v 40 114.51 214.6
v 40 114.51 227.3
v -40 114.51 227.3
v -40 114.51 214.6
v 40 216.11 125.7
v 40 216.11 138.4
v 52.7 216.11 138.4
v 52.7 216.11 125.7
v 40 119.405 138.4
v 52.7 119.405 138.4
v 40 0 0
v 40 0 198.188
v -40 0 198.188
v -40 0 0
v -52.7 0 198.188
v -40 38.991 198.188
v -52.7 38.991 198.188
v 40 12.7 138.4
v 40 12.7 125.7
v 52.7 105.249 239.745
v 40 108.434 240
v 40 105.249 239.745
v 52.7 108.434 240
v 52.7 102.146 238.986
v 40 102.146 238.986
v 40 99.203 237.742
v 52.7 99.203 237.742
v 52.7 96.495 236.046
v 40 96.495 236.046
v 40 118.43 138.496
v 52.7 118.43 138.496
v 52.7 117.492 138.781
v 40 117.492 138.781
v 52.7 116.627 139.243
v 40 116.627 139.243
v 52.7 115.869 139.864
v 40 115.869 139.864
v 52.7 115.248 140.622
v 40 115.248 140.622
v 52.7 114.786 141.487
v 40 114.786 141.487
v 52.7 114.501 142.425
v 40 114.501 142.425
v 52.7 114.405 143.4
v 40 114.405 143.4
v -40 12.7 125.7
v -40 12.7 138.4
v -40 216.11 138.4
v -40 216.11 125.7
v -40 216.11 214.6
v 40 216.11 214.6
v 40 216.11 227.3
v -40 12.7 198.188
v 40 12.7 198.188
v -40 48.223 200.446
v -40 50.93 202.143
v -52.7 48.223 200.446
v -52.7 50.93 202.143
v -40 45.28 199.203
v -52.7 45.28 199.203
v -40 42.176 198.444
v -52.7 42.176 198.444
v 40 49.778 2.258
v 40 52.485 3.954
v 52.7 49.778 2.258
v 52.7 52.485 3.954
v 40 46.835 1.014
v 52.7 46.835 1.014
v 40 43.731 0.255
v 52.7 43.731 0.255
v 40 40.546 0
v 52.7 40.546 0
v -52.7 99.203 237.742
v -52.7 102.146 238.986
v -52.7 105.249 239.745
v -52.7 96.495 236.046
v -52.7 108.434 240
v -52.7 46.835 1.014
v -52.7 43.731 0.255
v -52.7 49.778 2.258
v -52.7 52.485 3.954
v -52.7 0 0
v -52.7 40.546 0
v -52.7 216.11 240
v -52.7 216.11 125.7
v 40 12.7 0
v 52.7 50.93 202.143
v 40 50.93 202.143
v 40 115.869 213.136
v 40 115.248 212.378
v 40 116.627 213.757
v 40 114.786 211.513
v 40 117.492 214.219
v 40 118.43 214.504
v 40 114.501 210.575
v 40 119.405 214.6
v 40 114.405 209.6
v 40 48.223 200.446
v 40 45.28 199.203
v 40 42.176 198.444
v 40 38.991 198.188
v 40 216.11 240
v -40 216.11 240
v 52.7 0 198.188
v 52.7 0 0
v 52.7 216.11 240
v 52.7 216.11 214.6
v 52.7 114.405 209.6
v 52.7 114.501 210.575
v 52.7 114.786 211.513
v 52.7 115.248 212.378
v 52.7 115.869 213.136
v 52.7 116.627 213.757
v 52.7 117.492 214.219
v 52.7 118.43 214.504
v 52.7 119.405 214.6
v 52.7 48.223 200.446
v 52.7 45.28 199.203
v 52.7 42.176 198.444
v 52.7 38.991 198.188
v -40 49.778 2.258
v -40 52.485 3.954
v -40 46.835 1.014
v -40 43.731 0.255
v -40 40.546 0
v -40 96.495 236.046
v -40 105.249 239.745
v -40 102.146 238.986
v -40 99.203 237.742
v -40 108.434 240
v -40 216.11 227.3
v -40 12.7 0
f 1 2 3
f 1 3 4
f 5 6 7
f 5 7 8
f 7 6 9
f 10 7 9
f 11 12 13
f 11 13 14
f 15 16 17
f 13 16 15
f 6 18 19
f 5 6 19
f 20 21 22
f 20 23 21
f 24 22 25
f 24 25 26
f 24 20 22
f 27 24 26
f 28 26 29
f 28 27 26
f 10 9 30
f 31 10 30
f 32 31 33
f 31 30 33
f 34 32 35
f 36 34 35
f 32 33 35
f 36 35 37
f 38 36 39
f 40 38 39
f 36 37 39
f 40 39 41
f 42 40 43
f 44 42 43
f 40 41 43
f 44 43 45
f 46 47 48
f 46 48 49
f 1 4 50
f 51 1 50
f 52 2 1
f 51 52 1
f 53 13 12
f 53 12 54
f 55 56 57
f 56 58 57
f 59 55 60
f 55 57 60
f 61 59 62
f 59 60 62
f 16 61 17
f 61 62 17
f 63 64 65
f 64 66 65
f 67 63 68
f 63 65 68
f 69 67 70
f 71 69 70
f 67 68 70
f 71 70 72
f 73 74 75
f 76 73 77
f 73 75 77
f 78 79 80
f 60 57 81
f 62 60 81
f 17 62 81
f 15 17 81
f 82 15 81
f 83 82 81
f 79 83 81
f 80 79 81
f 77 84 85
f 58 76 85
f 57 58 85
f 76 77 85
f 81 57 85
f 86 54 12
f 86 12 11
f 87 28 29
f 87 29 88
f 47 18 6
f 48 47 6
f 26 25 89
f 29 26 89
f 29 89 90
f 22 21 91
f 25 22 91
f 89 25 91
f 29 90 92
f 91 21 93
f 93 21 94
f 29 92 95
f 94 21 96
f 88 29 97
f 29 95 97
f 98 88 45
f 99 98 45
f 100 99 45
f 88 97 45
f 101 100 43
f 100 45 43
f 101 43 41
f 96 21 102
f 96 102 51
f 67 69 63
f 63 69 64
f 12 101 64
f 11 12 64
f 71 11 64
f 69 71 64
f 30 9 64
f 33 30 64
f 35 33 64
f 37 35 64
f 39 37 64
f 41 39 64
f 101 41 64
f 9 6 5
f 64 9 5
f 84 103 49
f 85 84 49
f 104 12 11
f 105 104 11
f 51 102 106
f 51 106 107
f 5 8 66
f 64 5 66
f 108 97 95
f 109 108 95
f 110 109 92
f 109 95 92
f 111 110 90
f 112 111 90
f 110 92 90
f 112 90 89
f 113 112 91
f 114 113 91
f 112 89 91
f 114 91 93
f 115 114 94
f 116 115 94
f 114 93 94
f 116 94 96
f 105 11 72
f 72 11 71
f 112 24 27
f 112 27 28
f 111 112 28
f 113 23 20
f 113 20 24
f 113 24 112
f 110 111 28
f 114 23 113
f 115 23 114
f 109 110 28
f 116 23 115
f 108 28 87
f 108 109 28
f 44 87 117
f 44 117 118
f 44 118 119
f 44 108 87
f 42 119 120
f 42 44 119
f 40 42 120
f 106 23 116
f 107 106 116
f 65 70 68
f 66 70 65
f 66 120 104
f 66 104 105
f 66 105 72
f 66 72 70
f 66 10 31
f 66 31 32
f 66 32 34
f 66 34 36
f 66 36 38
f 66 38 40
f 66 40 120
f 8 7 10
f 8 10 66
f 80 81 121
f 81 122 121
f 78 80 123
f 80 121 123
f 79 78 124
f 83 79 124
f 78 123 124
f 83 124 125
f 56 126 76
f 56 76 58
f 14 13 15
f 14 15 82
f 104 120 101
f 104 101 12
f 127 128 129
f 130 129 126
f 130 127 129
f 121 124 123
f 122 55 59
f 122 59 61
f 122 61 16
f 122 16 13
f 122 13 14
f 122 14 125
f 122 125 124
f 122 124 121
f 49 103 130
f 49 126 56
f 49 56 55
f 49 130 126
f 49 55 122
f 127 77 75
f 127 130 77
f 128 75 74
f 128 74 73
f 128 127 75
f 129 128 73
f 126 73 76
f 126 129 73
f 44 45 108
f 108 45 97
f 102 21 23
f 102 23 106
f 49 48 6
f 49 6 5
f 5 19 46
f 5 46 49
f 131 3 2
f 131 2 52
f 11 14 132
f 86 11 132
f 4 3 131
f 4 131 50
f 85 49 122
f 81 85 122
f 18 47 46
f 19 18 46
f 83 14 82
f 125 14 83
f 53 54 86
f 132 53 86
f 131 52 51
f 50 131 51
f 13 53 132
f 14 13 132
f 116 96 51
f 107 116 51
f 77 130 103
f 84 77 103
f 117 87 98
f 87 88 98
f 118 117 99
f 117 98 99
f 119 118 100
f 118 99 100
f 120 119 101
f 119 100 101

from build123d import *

# Parameters (mm, degrees)
BOSS_EXTRUDE1_START     = 40
SKETCH1_W               = 240
SKETCH1_H               = 216.11
BOSS_EXTRUDE1_DEPTH     = 12.7
CUT_EXTRUDE1_DEPTH      = 1
CUT_EXTRUDE1_DEPTH_BACK = 106.4
BOSS_EXTRUDE2_START     = -12.7
SKETCH3_W               = 198.18830704
SKETCH3_H               = 12.7
BOSS_EXTRUDE2_DEPTH     = 80
BOSS_EXTRUDE3_START     = -12.7
SKETCH4_W               = 12.7
SKETCH4_H               = 203.41
BOSS_EXTRUDE3_DEPTH     = 80
SKETCH5_W               = 12.7
SKETCH5_H               = 101.6
BOSS_EXTRUDE4_DEPTH     = 80
CUT_EXTRUDE2_DEPTH      = 223.7
FILLET1_R               = 20
FILLET2_R               = 20


with BuildPart() as part:
    # Sketch1 → Boss-Extrude1 (new body)
    with BuildSketch(Plane(origin=(0, 0, 0), x_dir=(0, 0, -1), z_dir=(1, 0, 0)).offset(BOSS_EXTRUDE1_START)):
        with Locations((-120, 108.055)):
            Rectangle(SKETCH1_W, SKETCH1_H)
    extrude(amount=BOSS_EXTRUDE1_DEPTH)


with BuildPart() as body_2:
    # Mirror3: mirrored copy
    add(part.part.mirror(Plane(origin=(0, 0, 0), x_dir=(0, 0, 1), z_dir=(1, 0, 0))))


with BuildPart() as cut_extrude1_tool:
    # Sketch2 → Cut-Extrude1 (new body, two sides)
    with BuildSketch(Plane(origin=(52.7, 0, 0), x_dir=(0, 0, -1), z_dir=(1, 0, 0))) as cut_extrude1_sk:
        Polygon((-125.7, 216.11), (0, 47.170775707), (0, 216.11), align=None)
        Polygon((-240, 101.81), (-198.18830704, 45.615608791), (-198.18830704, 0), (-240, 0), align=None)
    extrude(amount=CUT_EXTRUDE1_DEPTH)
    extrude(cut_extrude1_sk.sketch, amount=-CUT_EXTRUDE1_DEPTH_BACK)


with BuildPart() as part_1:
    add(part.part)

    # Cut-Extrude1: cut by cut_extrude1_tool
    add(cut_extrude1_tool.part, mode=Mode.SUBTRACT)

    # Sketch7 → Cut-Extrude2 (cut)
    with BuildSketch(Plane(origin=(0, 0, 0), x_dir=(0, 0, -1), z_dir=(1, 0, 0))):
        with BuildLine():
            Line((-214.6, 216.11), (-138.4, 216.11))
            Line((-138.4, 216.11), (-138.4, 119.405))
            ThreePointArc((-138.4, 119.405), (-139.864466094, 115.869466094), (-143.4, 114.405))
            Line((-143.4, 114.405), (-209.6, 114.405))
            ThreePointArc((-209.6, 114.405), (-213.135533906, 115.869466094), (-214.6, 119.405))
            Line((-214.6, 119.405), (-214.6, 216.11))
        make_face()
    extrude(amount=CUT_EXTRUDE2_DEPTH, mode=Mode.SUBTRACT)

    # Fillet1
    fillet1_edges = [part_1.edges().sort_by_distance(p)[0] for p in [
        (46.35, 47.170775707, 0),
        (46.35, 101.81, 240),
        (46.35, 45.615608791, 198.18830704),
    ]]
    fillet(fillet1_edges, radius=FILLET1_R)


with BuildPart() as body_2_1:
    add(body_2.part)

    # Cut-Extrude1: cut by cut_extrude1_tool
    add(cut_extrude1_tool.part, mode=Mode.SUBTRACT)

    # Fillet2
    fillet2_edges = [body_2_1.edges().sort_by_distance(p)[0] for p in [
        (-46.35, 47.170775707, 0),
        (-46.35, 101.81, 240),
        (-46.35, 45.615608791, 198.18830704),
    ]]
    fillet(fillet2_edges, radius=FILLET2_R)


with BuildPart() as body_3:
    # Sketch3 → Boss-Extrude2 (new body)
    with BuildSketch(Plane(origin=(52.7, 0, 0), x_dir=(0, 0, -1), z_dir=(1, 0, 0)).offset(BOSS_EXTRUDE2_START)):
        with Locations((-99.09415352, 6.35)):
            Rectangle(SKETCH3_W, SKETCH3_H)
    extrude(amount=-BOSS_EXTRUDE2_DEPTH)


with BuildPart() as body_4:
    # Sketch4 → Boss-Extrude3 (new body)
    with BuildSketch(Plane(origin=(52.7, 0, 0), x_dir=(0, 0, -1), z_dir=(1, 0, 0)).offset(BOSS_EXTRUDE3_START)):
        with Locations((-132.05, 114.405)):
            Rectangle(SKETCH4_W, SKETCH4_H)
    extrude(amount=-BOSS_EXTRUDE3_DEPTH)


with BuildPart() as body_5:
    # Sketch5 → Boss-Extrude4 (new body)
    with BuildSketch(Plane(origin=(-40, 0, 0), x_dir=(0, 0, -1), z_dir=(1, 0, 0))):
        with Locations((-220.95, 165.31)):
            Rectangle(SKETCH5_W, SKETCH5_H)
    extrude(amount=BOSS_EXTRUDE4_DEPTH)


solid = Compound([part_1.part, body_2_1.part, body_3.part, body_4.part, body_5.part])
